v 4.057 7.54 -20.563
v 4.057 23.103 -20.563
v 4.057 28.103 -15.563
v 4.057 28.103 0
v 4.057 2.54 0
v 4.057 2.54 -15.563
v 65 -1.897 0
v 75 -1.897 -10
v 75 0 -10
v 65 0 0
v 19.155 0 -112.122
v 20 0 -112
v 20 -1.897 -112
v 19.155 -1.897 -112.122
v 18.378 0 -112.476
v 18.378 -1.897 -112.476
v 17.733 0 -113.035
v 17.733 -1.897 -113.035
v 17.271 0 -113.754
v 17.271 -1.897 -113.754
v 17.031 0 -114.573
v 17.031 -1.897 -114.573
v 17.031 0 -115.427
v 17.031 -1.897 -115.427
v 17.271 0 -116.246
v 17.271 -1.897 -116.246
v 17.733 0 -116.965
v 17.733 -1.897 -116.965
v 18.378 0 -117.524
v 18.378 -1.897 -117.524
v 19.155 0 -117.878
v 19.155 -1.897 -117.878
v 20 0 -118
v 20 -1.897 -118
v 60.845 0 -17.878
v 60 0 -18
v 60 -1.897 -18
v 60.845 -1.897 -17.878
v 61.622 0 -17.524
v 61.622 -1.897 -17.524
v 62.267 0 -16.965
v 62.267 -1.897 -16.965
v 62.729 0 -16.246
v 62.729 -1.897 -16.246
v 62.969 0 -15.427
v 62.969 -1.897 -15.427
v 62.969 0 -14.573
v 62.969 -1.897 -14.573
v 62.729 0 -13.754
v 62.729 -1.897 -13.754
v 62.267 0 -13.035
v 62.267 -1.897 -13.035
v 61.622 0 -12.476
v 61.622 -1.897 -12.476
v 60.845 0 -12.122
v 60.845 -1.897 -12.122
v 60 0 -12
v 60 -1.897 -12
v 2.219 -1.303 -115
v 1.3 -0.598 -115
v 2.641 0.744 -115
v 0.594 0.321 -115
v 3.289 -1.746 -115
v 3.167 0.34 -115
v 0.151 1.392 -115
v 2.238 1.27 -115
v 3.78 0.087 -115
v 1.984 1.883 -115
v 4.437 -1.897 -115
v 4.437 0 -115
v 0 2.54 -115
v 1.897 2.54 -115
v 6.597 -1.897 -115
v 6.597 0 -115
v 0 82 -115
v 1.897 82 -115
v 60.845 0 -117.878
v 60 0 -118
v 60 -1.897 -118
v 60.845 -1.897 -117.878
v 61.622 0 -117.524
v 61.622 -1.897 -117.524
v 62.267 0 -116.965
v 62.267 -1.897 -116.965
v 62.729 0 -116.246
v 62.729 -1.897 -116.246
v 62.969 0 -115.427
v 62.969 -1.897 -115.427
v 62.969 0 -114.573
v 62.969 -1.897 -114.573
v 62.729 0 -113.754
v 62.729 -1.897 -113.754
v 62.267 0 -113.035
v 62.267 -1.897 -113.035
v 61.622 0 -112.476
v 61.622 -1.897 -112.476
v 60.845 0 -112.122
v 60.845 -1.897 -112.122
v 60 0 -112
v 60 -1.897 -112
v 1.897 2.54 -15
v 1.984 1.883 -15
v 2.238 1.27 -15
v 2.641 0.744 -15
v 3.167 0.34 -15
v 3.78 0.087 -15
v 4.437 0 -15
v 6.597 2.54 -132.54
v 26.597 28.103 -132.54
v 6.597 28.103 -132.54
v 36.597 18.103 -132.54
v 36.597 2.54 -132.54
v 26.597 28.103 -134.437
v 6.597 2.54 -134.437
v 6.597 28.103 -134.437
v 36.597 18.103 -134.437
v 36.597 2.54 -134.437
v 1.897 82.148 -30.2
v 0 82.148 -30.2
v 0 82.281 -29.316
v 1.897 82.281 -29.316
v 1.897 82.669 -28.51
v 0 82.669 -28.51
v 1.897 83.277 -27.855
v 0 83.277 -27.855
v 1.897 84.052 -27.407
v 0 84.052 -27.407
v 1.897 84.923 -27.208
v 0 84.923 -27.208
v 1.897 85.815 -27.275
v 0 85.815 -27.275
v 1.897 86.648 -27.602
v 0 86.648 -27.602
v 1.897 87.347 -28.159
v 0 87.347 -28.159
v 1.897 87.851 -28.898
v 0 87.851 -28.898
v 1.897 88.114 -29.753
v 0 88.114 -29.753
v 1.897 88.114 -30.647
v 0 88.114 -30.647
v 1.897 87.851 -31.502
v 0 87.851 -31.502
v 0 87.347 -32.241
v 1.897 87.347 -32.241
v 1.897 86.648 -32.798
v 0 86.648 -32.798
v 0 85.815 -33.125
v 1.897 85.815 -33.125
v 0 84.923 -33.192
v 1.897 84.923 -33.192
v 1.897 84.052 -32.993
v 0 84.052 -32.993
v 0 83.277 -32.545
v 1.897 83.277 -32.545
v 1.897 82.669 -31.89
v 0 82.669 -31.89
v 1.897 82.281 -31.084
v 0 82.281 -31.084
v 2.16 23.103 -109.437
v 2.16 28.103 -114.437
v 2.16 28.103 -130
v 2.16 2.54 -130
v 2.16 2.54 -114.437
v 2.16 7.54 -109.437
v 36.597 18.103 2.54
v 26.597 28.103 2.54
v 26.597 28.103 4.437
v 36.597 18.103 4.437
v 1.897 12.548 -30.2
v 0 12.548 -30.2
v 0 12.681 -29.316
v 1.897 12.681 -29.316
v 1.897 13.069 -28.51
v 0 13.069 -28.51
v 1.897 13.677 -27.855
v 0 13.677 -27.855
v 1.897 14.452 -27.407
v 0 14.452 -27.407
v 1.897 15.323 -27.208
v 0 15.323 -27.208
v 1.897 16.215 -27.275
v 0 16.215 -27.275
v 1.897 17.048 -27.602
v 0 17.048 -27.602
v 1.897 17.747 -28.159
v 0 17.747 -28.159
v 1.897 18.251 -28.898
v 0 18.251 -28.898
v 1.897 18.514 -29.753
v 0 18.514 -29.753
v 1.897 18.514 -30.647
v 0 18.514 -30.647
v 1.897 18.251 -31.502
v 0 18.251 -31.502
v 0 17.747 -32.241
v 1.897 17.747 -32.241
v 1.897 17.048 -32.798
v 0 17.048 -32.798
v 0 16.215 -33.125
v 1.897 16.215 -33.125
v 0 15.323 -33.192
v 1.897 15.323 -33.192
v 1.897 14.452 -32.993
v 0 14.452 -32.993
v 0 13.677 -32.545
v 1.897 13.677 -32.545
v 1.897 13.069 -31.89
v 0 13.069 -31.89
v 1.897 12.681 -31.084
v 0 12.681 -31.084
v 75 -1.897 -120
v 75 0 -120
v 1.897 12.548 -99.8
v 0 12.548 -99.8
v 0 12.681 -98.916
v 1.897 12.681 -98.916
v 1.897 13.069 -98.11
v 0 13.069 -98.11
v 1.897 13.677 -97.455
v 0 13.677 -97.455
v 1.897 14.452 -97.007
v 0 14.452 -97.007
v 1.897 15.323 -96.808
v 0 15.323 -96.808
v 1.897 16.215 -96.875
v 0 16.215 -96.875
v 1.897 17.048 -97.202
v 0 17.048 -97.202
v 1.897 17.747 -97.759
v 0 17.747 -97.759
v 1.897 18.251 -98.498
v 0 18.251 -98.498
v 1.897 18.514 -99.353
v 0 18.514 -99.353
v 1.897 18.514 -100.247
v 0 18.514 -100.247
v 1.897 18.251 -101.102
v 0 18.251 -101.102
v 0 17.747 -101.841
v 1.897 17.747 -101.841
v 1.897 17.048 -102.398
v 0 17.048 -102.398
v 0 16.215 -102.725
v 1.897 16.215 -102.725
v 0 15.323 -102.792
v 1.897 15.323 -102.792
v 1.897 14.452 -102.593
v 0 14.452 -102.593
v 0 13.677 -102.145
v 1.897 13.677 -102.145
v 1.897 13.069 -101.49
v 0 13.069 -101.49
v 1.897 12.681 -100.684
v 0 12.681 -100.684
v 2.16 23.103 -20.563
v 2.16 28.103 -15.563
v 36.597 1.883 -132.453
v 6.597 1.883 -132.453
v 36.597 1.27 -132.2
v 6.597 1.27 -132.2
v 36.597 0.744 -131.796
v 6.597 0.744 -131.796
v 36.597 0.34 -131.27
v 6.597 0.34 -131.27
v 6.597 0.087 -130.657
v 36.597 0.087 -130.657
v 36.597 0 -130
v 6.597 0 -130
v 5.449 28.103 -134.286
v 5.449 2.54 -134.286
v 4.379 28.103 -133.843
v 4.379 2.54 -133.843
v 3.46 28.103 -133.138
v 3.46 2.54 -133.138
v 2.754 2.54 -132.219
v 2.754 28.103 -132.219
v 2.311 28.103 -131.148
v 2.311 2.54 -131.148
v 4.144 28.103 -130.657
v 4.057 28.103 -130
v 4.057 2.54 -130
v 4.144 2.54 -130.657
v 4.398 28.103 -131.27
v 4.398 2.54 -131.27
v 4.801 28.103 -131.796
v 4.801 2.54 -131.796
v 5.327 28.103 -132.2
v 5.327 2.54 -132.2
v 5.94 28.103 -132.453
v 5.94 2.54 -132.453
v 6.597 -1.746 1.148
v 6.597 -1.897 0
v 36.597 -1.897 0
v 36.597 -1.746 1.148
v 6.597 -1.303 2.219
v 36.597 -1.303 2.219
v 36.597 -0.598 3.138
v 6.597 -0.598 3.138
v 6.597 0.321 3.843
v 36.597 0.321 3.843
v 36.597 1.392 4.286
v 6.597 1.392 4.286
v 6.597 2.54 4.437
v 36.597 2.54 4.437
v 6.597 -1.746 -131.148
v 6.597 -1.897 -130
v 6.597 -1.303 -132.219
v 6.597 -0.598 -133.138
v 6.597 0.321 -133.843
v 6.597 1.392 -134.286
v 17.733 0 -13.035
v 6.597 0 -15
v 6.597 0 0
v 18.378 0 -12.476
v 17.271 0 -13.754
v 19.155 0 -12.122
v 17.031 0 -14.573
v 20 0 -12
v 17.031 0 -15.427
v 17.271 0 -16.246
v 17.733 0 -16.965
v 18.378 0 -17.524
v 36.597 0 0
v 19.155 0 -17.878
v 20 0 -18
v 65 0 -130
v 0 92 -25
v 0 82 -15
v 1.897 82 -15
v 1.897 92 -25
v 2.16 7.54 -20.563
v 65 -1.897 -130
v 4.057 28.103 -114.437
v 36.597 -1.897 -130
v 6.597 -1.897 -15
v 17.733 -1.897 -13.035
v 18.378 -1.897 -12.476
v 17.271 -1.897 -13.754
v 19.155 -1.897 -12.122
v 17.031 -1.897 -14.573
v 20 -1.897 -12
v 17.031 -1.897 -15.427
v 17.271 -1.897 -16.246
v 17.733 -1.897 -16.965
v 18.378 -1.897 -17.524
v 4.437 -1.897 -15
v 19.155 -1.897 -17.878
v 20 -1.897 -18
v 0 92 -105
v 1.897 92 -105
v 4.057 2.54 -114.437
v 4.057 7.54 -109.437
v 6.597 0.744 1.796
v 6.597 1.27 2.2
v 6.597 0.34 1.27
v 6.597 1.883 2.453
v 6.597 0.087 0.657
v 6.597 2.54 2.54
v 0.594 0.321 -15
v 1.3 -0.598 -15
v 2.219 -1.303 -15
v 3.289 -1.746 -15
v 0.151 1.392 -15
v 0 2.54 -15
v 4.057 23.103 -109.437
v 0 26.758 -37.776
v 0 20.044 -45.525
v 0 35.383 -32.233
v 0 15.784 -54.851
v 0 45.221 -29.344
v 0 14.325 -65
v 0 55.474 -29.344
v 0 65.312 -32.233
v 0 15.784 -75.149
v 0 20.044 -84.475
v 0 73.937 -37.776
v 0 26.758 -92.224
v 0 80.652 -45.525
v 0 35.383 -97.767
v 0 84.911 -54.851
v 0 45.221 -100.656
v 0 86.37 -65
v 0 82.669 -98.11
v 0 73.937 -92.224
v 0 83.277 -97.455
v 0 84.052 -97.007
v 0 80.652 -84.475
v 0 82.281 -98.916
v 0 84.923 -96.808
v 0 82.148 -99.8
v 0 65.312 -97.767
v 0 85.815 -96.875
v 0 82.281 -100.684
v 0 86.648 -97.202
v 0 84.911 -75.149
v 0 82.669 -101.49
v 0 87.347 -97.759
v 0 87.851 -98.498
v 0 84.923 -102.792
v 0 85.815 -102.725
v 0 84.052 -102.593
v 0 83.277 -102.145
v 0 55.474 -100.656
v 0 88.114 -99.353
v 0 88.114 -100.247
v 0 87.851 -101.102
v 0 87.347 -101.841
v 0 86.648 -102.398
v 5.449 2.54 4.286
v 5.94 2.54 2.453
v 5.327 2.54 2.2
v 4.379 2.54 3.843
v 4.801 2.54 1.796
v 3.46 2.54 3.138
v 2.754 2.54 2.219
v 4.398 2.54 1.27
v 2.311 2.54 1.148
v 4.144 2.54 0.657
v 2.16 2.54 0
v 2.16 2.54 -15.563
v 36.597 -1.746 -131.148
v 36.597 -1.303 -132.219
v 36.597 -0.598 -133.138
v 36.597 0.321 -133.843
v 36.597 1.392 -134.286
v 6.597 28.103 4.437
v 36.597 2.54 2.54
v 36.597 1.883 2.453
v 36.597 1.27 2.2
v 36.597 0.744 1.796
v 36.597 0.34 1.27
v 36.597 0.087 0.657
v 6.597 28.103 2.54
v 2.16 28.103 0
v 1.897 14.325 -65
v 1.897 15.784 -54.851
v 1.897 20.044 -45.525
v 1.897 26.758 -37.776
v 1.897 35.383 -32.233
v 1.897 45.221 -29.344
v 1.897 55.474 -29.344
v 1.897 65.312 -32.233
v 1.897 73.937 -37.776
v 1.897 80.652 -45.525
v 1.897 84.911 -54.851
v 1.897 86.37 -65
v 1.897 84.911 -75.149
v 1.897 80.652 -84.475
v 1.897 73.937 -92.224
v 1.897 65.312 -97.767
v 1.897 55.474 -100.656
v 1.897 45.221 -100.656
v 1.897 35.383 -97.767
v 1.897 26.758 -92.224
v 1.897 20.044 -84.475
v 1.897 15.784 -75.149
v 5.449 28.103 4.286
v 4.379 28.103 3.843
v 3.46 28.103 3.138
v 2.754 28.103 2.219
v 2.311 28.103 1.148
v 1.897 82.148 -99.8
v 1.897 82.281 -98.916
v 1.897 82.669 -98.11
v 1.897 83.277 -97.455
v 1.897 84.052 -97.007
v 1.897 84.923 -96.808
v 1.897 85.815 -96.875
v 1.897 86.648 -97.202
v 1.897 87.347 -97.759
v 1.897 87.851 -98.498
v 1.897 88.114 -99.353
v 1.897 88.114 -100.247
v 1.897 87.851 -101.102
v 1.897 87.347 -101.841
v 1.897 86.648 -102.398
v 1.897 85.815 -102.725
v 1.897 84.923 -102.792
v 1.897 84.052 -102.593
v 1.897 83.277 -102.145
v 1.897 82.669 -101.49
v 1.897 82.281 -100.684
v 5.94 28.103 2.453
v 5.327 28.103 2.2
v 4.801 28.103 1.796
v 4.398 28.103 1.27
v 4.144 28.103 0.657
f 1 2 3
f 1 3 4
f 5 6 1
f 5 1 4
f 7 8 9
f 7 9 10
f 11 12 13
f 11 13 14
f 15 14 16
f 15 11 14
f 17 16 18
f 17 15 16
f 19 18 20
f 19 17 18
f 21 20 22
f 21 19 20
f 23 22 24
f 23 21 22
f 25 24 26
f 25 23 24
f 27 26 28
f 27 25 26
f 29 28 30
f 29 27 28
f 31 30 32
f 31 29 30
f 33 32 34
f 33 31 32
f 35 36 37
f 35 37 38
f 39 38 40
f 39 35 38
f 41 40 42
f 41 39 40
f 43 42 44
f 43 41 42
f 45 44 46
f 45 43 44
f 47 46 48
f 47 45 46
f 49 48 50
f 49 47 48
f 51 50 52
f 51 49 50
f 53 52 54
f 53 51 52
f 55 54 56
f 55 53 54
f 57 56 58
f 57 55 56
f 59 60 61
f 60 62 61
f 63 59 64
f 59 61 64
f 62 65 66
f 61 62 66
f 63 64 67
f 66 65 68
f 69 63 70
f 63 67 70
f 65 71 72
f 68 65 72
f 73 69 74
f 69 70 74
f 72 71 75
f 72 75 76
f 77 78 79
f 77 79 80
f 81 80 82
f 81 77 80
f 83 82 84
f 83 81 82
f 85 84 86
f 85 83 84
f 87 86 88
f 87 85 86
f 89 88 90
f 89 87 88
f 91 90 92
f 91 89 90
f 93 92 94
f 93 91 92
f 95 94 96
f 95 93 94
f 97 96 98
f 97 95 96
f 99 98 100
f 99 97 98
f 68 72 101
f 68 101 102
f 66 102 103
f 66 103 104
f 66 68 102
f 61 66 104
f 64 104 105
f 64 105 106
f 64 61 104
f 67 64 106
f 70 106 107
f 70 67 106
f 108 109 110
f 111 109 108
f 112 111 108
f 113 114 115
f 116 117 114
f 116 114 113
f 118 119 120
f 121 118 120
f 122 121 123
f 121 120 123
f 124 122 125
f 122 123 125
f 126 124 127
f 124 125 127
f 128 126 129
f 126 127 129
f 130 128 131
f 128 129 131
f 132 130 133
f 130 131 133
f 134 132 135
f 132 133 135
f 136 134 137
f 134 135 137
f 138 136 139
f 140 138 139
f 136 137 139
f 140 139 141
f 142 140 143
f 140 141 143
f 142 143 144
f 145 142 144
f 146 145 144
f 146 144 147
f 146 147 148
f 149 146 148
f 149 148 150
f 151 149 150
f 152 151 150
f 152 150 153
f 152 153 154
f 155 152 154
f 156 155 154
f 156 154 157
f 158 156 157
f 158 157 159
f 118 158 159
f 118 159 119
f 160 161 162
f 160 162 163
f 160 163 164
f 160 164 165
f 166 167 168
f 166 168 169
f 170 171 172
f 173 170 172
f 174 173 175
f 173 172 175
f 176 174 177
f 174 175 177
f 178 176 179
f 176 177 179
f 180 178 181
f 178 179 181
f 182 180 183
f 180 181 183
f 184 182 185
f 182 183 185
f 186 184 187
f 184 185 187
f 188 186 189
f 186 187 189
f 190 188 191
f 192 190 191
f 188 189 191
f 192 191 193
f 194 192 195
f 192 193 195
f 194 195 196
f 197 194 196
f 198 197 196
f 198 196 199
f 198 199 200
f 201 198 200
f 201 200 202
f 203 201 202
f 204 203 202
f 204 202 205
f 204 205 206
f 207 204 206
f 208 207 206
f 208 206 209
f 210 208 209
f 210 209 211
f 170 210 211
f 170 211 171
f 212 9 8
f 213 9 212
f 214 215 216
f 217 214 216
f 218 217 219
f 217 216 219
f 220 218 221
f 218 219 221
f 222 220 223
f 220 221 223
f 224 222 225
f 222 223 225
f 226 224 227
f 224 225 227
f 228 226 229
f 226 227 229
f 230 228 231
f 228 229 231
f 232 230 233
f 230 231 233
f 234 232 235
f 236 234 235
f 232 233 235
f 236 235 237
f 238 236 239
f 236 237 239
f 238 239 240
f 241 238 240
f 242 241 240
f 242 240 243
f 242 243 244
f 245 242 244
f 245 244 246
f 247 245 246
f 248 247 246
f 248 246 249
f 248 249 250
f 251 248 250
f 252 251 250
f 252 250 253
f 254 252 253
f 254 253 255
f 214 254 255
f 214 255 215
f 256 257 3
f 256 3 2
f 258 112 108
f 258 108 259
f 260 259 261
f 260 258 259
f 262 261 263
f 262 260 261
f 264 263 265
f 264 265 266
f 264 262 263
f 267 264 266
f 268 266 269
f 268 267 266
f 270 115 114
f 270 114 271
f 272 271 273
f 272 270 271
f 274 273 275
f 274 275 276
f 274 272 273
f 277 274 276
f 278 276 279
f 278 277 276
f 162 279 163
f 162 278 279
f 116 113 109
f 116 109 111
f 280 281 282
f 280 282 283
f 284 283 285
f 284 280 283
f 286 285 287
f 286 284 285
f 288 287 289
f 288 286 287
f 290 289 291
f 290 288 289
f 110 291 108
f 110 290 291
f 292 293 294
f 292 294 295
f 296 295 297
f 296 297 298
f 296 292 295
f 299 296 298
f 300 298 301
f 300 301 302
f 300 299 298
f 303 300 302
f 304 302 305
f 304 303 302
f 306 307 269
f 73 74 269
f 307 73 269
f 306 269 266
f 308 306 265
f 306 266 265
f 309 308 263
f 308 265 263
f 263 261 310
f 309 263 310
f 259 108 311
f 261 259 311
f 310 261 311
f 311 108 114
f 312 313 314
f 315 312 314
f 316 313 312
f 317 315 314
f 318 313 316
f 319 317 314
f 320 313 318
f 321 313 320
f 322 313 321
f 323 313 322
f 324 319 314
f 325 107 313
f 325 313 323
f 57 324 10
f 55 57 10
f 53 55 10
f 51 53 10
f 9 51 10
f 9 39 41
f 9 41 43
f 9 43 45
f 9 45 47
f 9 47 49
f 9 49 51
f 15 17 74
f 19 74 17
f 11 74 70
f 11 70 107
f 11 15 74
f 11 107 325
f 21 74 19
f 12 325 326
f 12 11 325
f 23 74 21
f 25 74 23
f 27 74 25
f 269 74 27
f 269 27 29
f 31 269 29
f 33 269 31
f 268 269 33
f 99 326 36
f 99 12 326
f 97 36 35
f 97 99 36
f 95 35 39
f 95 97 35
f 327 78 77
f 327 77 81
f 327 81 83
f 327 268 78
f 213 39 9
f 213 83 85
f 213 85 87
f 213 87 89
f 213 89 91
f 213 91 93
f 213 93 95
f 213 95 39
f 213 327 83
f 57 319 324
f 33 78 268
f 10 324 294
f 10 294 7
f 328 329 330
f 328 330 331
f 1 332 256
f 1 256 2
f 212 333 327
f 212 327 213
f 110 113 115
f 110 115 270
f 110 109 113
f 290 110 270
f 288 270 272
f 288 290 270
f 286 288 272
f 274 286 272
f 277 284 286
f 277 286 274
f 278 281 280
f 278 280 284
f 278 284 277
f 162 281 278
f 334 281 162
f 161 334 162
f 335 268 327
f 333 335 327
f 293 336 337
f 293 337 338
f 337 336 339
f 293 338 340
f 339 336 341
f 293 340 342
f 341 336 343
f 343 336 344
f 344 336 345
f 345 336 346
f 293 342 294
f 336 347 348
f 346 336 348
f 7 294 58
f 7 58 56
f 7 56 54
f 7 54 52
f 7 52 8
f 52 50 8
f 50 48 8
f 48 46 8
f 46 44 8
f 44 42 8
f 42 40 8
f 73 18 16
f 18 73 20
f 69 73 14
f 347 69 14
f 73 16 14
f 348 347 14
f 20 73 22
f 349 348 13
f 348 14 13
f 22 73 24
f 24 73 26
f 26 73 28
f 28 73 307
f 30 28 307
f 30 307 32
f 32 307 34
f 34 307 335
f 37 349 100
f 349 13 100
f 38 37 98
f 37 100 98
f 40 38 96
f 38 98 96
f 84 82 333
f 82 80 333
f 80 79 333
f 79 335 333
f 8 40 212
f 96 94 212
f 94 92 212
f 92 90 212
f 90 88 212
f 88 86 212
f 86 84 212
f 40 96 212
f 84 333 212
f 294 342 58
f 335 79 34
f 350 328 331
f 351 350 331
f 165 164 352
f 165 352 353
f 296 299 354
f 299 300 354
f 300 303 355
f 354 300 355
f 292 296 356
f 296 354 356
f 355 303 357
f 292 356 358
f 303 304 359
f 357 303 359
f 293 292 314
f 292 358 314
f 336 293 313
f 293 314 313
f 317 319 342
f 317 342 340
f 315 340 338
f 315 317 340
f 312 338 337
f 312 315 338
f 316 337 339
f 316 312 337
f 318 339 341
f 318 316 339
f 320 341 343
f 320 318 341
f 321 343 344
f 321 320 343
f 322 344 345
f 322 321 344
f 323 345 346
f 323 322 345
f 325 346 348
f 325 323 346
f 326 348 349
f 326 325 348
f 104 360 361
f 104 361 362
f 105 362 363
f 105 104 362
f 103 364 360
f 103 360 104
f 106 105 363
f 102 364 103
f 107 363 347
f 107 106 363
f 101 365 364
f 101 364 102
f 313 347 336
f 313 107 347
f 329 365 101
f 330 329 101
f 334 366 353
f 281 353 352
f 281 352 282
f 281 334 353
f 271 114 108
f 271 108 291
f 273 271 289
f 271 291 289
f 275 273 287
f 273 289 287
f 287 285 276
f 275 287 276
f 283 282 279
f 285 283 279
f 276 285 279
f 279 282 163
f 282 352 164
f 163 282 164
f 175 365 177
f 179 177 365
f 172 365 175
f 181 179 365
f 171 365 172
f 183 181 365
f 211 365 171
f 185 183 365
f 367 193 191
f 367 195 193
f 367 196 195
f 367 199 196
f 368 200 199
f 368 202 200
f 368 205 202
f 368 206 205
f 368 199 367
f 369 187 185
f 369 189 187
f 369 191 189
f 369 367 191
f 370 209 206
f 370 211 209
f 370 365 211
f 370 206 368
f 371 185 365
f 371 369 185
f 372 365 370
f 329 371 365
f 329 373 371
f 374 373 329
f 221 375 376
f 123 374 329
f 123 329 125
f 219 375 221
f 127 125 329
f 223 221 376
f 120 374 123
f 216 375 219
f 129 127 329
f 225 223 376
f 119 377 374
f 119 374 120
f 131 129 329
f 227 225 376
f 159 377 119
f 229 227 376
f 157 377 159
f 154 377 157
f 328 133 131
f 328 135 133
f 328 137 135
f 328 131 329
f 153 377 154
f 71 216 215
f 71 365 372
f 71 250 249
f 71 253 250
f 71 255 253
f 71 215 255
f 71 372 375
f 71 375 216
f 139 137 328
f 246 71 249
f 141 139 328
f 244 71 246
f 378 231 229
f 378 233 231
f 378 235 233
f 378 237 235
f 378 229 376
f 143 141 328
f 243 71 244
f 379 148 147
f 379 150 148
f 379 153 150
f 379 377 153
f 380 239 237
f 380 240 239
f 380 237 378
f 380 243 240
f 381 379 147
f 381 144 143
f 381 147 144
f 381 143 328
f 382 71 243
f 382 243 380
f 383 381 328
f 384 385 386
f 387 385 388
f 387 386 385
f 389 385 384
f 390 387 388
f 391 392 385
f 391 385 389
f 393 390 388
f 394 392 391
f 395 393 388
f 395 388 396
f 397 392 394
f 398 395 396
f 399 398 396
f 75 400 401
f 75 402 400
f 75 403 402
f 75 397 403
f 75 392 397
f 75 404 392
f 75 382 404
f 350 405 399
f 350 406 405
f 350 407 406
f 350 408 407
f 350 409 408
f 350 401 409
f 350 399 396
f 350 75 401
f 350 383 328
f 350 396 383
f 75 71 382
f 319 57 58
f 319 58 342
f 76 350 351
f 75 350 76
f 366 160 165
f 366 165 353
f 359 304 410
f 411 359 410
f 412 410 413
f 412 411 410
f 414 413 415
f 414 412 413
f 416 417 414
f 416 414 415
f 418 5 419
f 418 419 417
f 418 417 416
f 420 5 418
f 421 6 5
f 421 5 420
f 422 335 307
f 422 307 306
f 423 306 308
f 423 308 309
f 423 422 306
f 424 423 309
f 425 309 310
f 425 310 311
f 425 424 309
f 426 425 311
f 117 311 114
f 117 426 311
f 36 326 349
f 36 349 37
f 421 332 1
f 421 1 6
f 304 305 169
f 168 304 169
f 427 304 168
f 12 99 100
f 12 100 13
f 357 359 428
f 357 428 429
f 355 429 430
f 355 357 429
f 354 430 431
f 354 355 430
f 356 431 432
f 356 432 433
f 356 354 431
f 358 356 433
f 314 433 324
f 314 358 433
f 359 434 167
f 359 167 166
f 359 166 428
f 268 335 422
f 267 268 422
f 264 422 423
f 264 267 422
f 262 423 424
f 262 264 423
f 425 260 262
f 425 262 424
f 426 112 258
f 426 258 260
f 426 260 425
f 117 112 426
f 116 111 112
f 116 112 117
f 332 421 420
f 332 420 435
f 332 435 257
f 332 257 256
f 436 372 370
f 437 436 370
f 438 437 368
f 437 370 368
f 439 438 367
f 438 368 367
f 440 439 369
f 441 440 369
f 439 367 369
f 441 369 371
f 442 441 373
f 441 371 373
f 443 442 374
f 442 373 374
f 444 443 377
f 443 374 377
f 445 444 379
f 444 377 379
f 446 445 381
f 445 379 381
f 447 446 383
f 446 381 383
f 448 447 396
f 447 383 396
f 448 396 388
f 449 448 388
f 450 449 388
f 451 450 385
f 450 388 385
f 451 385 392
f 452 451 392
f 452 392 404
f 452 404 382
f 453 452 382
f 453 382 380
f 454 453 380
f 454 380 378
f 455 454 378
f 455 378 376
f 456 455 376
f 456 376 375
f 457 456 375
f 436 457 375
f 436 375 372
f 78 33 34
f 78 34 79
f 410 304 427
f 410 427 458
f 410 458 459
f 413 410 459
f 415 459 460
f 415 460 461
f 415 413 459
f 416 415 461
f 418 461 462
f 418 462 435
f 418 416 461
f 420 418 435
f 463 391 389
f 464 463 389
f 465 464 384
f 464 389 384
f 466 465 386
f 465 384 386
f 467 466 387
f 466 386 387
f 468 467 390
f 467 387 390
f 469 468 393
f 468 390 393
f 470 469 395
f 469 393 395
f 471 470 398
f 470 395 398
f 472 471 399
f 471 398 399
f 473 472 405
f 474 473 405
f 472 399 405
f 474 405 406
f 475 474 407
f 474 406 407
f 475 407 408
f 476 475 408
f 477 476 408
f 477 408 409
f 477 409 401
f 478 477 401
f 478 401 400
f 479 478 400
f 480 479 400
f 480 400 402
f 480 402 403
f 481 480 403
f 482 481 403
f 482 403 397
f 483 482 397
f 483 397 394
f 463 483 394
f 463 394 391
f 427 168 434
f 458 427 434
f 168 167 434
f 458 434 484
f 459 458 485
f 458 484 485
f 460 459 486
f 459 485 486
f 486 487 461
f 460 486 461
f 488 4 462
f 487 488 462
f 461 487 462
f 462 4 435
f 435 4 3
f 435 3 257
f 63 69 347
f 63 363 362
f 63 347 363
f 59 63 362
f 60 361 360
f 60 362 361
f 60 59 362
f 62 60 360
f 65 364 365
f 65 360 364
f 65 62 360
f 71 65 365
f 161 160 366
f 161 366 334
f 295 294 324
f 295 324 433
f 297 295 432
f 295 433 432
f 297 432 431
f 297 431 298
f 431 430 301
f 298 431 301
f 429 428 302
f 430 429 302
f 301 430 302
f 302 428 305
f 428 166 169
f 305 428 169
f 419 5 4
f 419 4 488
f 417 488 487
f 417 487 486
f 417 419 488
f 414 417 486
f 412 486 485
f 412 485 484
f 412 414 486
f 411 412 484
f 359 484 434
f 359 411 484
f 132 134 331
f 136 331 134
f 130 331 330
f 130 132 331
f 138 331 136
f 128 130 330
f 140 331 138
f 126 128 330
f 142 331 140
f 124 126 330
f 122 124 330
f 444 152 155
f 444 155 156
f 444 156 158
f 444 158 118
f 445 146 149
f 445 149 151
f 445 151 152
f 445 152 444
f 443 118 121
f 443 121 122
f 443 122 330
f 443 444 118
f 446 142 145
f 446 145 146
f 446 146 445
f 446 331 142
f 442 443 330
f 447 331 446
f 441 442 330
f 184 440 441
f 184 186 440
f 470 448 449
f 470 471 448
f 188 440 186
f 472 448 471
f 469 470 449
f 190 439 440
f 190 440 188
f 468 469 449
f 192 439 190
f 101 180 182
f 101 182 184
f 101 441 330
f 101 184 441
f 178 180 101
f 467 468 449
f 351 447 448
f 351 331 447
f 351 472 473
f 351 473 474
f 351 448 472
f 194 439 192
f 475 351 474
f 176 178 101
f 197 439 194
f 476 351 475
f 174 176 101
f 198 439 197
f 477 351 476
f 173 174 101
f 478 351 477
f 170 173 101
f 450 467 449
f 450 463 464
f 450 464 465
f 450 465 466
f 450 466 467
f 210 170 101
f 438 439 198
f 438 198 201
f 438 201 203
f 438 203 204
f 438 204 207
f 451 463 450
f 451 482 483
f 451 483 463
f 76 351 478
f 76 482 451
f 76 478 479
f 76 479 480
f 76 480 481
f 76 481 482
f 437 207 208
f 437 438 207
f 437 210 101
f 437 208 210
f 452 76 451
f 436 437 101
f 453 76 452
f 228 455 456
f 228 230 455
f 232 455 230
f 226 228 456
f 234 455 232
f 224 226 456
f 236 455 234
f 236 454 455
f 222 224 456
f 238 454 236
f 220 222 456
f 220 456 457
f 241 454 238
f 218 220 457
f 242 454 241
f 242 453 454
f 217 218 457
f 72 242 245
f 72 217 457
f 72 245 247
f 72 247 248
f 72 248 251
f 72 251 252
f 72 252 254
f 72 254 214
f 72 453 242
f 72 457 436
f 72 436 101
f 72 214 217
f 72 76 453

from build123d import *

# Parameters (mm, degrees)
SKETCH1_W                     = 75
SKETCH1_H                     = 130
BASE_FLANGE1_DEPTH            = 1.89738
EDGE_FLANGE1_STRIP_W          = 12.66952
EDGE_FLANGE1_STRIP_H          = 1.89738
EDGE_FLANGE1_STRIP_CUT_DEPTH  = 100
EDGE_FLANGE1_RELIEF_W         = 13.61821
EDGE_FLANGE1_RELIEF_H         = 0.94869
EDGE_FLANGE1_RELIEF_CUT_DEPTH = 1.89738
EDGE_FLANGE1_DEPTH            = 100
SKETCH18_R                    = 3
SKETCH18_R_2                  = 36.022471604
CUT_EXTRUDE1_DEPTH            = 10
BREAK_CORNER1_DEPTH           = 1.89738
BREAK_CORNER2_START           = -1.89738
BREAK_CORNER2_DEPTH           = 1.89738
CUT_EXTRUDE2_DEPTH            = 10
EDGE_FLANGE2_DEPTH            = 30
EDGE_FLANGE3_DEPTH            = 25.56262
EDGE_FLANGE4_DEPTH            = 30
EDGE_FLANGE5_DEPTH            = 25.56262
BREAK_CORNER3_START           = 38.678740931
BREAK_CORNER3_OUTLINE_W       = 18
BREAK_CORNER3_OUTLINE_H       = 1.89738
BREAK_CORNER3_DEPTH           = 7.071067812
BREAK_CORNER4_START           = 2.16
BREAK_CORNER4_DEPTH           = 1.89738
SKETCH32_W                    = 6.59738
SKETCH32_H                    = 15
CUT_EXTRUDE3_DEPTH            = 10


# Read off the part's stored shape, not the designer's step: Break-Corner1, Break-Corner2, Break-Corner3, Break-Corner4
# Sheet-metal steps are written as plain solids
with BuildPart() as part:
    # Sketch1 → Base-Flange1 (new body)
    with BuildSketch(Plane(origin=(0, 0, 0), x_dir=(1, 0, 0), z_dir=(0, 1, 0))):
        with Locations((37.5, 65)):
            Rectangle(SKETCH1_W, SKETCH1_H)
    extrude(amount=-BASE_FLANGE1_DEPTH)

    # Edge-Flange1 strip (across the edge) → Edge-Flange1 strip cut (cut)
    with BuildSketch(Plane.XY.offset(-115)):
        with Locations((-1.89738, -0.94869)):
            Rectangle(EDGE_FLANGE1_STRIP_W, EDGE_FLANGE1_STRIP_H)
    extrude(amount=EDGE_FLANGE1_STRIP_CUT_DEPTH, mode=Mode.SUBTRACT)

    # Edge-Flange1 relief (on the sheet) → Edge-Flange1 relief cut (cut)
    with BuildSketch(Plane(origin=(4.43738, 0, -115), x_dir=(1, 0, 0), z_dir=(0, 1, 0))):
        with Locations((-5.860415, 0.474345)):
            Rectangle(EDGE_FLANGE1_RELIEF_W, EDGE_FLANGE1_RELIEF_H)
        with Locations((-5.860415, -100.474345)):
            Rectangle(EDGE_FLANGE1_RELIEF_W, EDGE_FLANGE1_RELIEF_H)
    extrude(amount=-EDGE_FLANGE1_RELIEF_CUT_DEPTH, mode=Mode.SUBTRACT)

    # Edge-Flange1 section (across the edge) → Edge-Flange1 (add)
    with BuildSketch(Plane.XY.offset(-115)):
        with BuildLine():
            Line((0, 2.54), (0, 92))
            Line((0, 92), (1.89738, 92))
            Line((1.89738, 92), (1.89738, 2.54))
            ThreePointArc((1.89738, 2.54), (2.641328776, 0.743948776), (4.43738, 0))
            Line((4.43738, 0), (4.43738, -1.89738))
            ThreePointArc((4.43738, -1.89738), (1.299678511, -0.597701489), (0, 2.54))
        make_face()
    extrude(amount=EDGE_FLANGE1_DEPTH)

    # Sketch18 → Cut-Extrude1 (cut)
    with BuildSketch(Plane.ZY):
        with Locations(Location((-99.8, 85.14762, 0), (0, 0, 270))):
            Circle(SKETCH18_R)
        with Locations(Location((-30.2, 85.14762, 0), (0, 0, 270))):
            Circle(SKETCH18_R)
        with Locations(Location((-30.2, 15.54762, 0), (0, 0, 270))):
            Circle(SKETCH18_R)
        with Locations(Location((-99.8, 15.54762, 0), (0, 0, 270))):
            Circle(SKETCH18_R)
        with Locations(Location((-65, 50.34762, 0), (0, 0, 270))):
            Circle(SKETCH18_R_2)
    extrude(amount=-CUT_EXTRUDE1_DEPTH, mode=Mode.SUBTRACT)

    # Break-Corner1 outline → Break-Corner1 (cut)
    with BuildSketch(Plane.YZ):
        Polygon((92, -15), (82, -15), (92, -25), align=None)
        Polygon((92, -115), (92, -105), (82, -115), align=None)
    extrude(amount=BREAK_CORNER1_DEPTH, mode=Mode.SUBTRACT)

    # Break-Corner2 outline → Break-Corner2 (cut)
    with BuildSketch(Plane(origin=(0, 0, 0), x_dir=(1, 0, 0), z_dir=(0, 1, 0)).offset(BREAK_CORNER2_START)):
        Polygon((75, 130), (65, 130), (75, 120), align=None)
        Polygon((75, 0), (75, 10), (65, 0), align=None)
    extrude(amount=BREAK_CORNER2_DEPTH, mode=Mode.SUBTRACT)

    # Sketch19 → Cut-Extrude2 (cut)
    with BuildSketch(Plane(origin=(0, 0, 0), x_dir=(1, 0, 0), z_dir=(0, 1, 0))):
        with BuildLine():
            Line((60, 112), (20, 112))
            ThreePointArc((20, 112), (17, 115), (20, 118))
            Line((20, 118), (60, 118))
            ThreePointArc((60, 118), (63, 115), (60, 112))
        make_face()
        with BuildLine():
            Line((60, 12), (20, 12))
            ThreePointArc((20, 12), (17, 15), (20, 18))
            Line((20, 18), (60, 18))
            ThreePointArc((60, 18), (63, 15), (60, 12))
        make_face()
    extrude(amount=-CUT_EXTRUDE2_DEPTH, mode=Mode.SUBTRACT)

    # Edge-Flange2 section (across the edge) → Edge-Flange2 (add)
    with BuildSketch(Plane(origin=(6.59738, 0, 2.54), x_dir=(0, 0, -1), z_dir=(1, 0, 0))):
        with BuildLine():
            Line((-1.89738, 2.54), (-1.89738, 28.10262))
            Line((-1.89738, 28.10262), (0, 28.10262))
            Line((0, 28.10262), (0, 2.54))
            ThreePointArc((0, 2.54), (0.743948776, 0.743948776), (2.54, 0))
            Line((2.54, 0), (2.54, -1.89738))
            ThreePointArc((2.54, -1.89738), (-0.597701489, -0.597701489), (-1.89738, 2.54))
        make_face()
    extrude(amount=EDGE_FLANGE2_DEPTH)

    # Edge-Flange3 section (across the edge) → Edge-Flange3 (add)
    with BuildSketch(Plane(origin=(4.05738, 2.54, 2.54), x_dir=(1, 0, 0), z_dir=(0, 1, 0))):
        with BuildLine():
            Line((-1.89738, 2.54), (-1.89738, 23.10262))
            Line((-1.89738, 23.10262), (0, 23.10262))
            Line((0, 23.10262), (0, 2.54))
            ThreePointArc((0, 2.54), (0.743948776, 0.743948776), (2.54, 0))
            Line((2.54, 0), (2.54, -1.89738))
            ThreePointArc((2.54, -1.89738), (-0.597701489, -0.597701489), (-1.89738, 2.54))
        make_face()
    extrude(amount=EDGE_FLANGE3_DEPTH)

    # Edge-Flange4 section (across the edge) → Edge-Flange4 (add)
    with BuildSketch(Plane(origin=(36.59738, 0, -132.54), x_dir=(0, 0, 1), z_dir=(-1, 0, 0))):
        with BuildLine():
            Line((-1.89738, 2.54), (-1.89738, 28.10262))
            Line((-1.89738, 28.10262), (0, 28.10262))
            Line((0, 28.10262), (0, 2.54))
            ThreePointArc((0, 2.54), (0.743948776, 0.743948776), (2.54, 0))
            Line((2.54, 0), (2.54, -1.89738))
            ThreePointArc((2.54, -1.89738), (-0.597701489, -0.597701489), (-1.89738, 2.54))
        make_face()
    extrude(amount=EDGE_FLANGE4_DEPTH)

    # Edge-Flange5 section (across the edge) → Edge-Flange5 (add)
    with BuildSketch(Plane(origin=(4.05738, 28.10262, -132.54), x_dir=(1, 0, 0), z_dir=(0, -1, 0))):
        with BuildLine():
            Line((-1.89738, 2.54), (-1.89738, 23.10262))
            Line((-1.89738, 23.10262), (0, 23.10262))
            Line((0, 23.10262), (0, 2.54))
            ThreePointArc((0, 2.54), (0.743948776, 0.743948776), (2.54, 0))
            Line((2.54, 0), (2.54, -1.89738))
            ThreePointArc((2.54, -1.89738), (-0.597701489, -0.597701489), (-1.89738, 2.54))
        make_face()
    extrude(amount=EDGE_FLANGE5_DEPTH)

    # Break-Corner3 outline → Break-Corner3 (cut)
    with BuildSketch(Plane(origin=(0, 0, 0), x_dir=(0.707106781186548, -0.707106781186547, 0), z_dir=(0.707106781186547, 0.707106781186548, 0)).offset(BREAK_CORNER3_START)):
        with Locations((6, -3.48869)):
            Rectangle(BREAK_CORNER3_OUTLINE_W, BREAK_CORNER3_OUTLINE_H)
        with Locations((6, 133.48869)):
            Rectangle(BREAK_CORNER3_OUTLINE_W, BREAK_CORNER3_OUTLINE_H)
    extrude(amount=BREAK_CORNER3_DEPTH, mode=Mode.SUBTRACT)

    # Break-Corner4 outline → Break-Corner4 (cut)
    with BuildSketch(Plane.YZ.offset(BREAK_CORNER4_START)):
        Polygon((2.54, -20.56262), (7.54, -20.56262), (2.54, -15.56262), align=None)
        Polygon((28.10262, -15.56262), (23.10262, -20.56262), (28.10262, -20.56262), align=None)
        Polygon((28.10262, -109.43738), (23.10262, -109.43738), (28.10262, -114.43738), align=None)
        Polygon((2.54, -114.43738), (7.54, -109.43738), (2.54, -109.43738), align=None)
    extrude(amount=BREAK_CORNER4_DEPTH, mode=Mode.SUBTRACT)

    # Sketch32 → Cut-Extrude3 (cut)
    with BuildSketch(Plane(origin=(0, 0, 0), x_dir=(1, 0, 0), z_dir=(0, 1, 0))):
        with Locations((3.29869, 122.5)):
            Rectangle(SKETCH32_W, SKETCH32_H)
        with Locations((3.29869, 7.5)):
            Rectangle(SKETCH32_W, SKETCH32_H)
    extrude(amount=-CUT_EXTRUDE3_DEPTH, mode=Mode.SUBTRACT)


solid = part.part
